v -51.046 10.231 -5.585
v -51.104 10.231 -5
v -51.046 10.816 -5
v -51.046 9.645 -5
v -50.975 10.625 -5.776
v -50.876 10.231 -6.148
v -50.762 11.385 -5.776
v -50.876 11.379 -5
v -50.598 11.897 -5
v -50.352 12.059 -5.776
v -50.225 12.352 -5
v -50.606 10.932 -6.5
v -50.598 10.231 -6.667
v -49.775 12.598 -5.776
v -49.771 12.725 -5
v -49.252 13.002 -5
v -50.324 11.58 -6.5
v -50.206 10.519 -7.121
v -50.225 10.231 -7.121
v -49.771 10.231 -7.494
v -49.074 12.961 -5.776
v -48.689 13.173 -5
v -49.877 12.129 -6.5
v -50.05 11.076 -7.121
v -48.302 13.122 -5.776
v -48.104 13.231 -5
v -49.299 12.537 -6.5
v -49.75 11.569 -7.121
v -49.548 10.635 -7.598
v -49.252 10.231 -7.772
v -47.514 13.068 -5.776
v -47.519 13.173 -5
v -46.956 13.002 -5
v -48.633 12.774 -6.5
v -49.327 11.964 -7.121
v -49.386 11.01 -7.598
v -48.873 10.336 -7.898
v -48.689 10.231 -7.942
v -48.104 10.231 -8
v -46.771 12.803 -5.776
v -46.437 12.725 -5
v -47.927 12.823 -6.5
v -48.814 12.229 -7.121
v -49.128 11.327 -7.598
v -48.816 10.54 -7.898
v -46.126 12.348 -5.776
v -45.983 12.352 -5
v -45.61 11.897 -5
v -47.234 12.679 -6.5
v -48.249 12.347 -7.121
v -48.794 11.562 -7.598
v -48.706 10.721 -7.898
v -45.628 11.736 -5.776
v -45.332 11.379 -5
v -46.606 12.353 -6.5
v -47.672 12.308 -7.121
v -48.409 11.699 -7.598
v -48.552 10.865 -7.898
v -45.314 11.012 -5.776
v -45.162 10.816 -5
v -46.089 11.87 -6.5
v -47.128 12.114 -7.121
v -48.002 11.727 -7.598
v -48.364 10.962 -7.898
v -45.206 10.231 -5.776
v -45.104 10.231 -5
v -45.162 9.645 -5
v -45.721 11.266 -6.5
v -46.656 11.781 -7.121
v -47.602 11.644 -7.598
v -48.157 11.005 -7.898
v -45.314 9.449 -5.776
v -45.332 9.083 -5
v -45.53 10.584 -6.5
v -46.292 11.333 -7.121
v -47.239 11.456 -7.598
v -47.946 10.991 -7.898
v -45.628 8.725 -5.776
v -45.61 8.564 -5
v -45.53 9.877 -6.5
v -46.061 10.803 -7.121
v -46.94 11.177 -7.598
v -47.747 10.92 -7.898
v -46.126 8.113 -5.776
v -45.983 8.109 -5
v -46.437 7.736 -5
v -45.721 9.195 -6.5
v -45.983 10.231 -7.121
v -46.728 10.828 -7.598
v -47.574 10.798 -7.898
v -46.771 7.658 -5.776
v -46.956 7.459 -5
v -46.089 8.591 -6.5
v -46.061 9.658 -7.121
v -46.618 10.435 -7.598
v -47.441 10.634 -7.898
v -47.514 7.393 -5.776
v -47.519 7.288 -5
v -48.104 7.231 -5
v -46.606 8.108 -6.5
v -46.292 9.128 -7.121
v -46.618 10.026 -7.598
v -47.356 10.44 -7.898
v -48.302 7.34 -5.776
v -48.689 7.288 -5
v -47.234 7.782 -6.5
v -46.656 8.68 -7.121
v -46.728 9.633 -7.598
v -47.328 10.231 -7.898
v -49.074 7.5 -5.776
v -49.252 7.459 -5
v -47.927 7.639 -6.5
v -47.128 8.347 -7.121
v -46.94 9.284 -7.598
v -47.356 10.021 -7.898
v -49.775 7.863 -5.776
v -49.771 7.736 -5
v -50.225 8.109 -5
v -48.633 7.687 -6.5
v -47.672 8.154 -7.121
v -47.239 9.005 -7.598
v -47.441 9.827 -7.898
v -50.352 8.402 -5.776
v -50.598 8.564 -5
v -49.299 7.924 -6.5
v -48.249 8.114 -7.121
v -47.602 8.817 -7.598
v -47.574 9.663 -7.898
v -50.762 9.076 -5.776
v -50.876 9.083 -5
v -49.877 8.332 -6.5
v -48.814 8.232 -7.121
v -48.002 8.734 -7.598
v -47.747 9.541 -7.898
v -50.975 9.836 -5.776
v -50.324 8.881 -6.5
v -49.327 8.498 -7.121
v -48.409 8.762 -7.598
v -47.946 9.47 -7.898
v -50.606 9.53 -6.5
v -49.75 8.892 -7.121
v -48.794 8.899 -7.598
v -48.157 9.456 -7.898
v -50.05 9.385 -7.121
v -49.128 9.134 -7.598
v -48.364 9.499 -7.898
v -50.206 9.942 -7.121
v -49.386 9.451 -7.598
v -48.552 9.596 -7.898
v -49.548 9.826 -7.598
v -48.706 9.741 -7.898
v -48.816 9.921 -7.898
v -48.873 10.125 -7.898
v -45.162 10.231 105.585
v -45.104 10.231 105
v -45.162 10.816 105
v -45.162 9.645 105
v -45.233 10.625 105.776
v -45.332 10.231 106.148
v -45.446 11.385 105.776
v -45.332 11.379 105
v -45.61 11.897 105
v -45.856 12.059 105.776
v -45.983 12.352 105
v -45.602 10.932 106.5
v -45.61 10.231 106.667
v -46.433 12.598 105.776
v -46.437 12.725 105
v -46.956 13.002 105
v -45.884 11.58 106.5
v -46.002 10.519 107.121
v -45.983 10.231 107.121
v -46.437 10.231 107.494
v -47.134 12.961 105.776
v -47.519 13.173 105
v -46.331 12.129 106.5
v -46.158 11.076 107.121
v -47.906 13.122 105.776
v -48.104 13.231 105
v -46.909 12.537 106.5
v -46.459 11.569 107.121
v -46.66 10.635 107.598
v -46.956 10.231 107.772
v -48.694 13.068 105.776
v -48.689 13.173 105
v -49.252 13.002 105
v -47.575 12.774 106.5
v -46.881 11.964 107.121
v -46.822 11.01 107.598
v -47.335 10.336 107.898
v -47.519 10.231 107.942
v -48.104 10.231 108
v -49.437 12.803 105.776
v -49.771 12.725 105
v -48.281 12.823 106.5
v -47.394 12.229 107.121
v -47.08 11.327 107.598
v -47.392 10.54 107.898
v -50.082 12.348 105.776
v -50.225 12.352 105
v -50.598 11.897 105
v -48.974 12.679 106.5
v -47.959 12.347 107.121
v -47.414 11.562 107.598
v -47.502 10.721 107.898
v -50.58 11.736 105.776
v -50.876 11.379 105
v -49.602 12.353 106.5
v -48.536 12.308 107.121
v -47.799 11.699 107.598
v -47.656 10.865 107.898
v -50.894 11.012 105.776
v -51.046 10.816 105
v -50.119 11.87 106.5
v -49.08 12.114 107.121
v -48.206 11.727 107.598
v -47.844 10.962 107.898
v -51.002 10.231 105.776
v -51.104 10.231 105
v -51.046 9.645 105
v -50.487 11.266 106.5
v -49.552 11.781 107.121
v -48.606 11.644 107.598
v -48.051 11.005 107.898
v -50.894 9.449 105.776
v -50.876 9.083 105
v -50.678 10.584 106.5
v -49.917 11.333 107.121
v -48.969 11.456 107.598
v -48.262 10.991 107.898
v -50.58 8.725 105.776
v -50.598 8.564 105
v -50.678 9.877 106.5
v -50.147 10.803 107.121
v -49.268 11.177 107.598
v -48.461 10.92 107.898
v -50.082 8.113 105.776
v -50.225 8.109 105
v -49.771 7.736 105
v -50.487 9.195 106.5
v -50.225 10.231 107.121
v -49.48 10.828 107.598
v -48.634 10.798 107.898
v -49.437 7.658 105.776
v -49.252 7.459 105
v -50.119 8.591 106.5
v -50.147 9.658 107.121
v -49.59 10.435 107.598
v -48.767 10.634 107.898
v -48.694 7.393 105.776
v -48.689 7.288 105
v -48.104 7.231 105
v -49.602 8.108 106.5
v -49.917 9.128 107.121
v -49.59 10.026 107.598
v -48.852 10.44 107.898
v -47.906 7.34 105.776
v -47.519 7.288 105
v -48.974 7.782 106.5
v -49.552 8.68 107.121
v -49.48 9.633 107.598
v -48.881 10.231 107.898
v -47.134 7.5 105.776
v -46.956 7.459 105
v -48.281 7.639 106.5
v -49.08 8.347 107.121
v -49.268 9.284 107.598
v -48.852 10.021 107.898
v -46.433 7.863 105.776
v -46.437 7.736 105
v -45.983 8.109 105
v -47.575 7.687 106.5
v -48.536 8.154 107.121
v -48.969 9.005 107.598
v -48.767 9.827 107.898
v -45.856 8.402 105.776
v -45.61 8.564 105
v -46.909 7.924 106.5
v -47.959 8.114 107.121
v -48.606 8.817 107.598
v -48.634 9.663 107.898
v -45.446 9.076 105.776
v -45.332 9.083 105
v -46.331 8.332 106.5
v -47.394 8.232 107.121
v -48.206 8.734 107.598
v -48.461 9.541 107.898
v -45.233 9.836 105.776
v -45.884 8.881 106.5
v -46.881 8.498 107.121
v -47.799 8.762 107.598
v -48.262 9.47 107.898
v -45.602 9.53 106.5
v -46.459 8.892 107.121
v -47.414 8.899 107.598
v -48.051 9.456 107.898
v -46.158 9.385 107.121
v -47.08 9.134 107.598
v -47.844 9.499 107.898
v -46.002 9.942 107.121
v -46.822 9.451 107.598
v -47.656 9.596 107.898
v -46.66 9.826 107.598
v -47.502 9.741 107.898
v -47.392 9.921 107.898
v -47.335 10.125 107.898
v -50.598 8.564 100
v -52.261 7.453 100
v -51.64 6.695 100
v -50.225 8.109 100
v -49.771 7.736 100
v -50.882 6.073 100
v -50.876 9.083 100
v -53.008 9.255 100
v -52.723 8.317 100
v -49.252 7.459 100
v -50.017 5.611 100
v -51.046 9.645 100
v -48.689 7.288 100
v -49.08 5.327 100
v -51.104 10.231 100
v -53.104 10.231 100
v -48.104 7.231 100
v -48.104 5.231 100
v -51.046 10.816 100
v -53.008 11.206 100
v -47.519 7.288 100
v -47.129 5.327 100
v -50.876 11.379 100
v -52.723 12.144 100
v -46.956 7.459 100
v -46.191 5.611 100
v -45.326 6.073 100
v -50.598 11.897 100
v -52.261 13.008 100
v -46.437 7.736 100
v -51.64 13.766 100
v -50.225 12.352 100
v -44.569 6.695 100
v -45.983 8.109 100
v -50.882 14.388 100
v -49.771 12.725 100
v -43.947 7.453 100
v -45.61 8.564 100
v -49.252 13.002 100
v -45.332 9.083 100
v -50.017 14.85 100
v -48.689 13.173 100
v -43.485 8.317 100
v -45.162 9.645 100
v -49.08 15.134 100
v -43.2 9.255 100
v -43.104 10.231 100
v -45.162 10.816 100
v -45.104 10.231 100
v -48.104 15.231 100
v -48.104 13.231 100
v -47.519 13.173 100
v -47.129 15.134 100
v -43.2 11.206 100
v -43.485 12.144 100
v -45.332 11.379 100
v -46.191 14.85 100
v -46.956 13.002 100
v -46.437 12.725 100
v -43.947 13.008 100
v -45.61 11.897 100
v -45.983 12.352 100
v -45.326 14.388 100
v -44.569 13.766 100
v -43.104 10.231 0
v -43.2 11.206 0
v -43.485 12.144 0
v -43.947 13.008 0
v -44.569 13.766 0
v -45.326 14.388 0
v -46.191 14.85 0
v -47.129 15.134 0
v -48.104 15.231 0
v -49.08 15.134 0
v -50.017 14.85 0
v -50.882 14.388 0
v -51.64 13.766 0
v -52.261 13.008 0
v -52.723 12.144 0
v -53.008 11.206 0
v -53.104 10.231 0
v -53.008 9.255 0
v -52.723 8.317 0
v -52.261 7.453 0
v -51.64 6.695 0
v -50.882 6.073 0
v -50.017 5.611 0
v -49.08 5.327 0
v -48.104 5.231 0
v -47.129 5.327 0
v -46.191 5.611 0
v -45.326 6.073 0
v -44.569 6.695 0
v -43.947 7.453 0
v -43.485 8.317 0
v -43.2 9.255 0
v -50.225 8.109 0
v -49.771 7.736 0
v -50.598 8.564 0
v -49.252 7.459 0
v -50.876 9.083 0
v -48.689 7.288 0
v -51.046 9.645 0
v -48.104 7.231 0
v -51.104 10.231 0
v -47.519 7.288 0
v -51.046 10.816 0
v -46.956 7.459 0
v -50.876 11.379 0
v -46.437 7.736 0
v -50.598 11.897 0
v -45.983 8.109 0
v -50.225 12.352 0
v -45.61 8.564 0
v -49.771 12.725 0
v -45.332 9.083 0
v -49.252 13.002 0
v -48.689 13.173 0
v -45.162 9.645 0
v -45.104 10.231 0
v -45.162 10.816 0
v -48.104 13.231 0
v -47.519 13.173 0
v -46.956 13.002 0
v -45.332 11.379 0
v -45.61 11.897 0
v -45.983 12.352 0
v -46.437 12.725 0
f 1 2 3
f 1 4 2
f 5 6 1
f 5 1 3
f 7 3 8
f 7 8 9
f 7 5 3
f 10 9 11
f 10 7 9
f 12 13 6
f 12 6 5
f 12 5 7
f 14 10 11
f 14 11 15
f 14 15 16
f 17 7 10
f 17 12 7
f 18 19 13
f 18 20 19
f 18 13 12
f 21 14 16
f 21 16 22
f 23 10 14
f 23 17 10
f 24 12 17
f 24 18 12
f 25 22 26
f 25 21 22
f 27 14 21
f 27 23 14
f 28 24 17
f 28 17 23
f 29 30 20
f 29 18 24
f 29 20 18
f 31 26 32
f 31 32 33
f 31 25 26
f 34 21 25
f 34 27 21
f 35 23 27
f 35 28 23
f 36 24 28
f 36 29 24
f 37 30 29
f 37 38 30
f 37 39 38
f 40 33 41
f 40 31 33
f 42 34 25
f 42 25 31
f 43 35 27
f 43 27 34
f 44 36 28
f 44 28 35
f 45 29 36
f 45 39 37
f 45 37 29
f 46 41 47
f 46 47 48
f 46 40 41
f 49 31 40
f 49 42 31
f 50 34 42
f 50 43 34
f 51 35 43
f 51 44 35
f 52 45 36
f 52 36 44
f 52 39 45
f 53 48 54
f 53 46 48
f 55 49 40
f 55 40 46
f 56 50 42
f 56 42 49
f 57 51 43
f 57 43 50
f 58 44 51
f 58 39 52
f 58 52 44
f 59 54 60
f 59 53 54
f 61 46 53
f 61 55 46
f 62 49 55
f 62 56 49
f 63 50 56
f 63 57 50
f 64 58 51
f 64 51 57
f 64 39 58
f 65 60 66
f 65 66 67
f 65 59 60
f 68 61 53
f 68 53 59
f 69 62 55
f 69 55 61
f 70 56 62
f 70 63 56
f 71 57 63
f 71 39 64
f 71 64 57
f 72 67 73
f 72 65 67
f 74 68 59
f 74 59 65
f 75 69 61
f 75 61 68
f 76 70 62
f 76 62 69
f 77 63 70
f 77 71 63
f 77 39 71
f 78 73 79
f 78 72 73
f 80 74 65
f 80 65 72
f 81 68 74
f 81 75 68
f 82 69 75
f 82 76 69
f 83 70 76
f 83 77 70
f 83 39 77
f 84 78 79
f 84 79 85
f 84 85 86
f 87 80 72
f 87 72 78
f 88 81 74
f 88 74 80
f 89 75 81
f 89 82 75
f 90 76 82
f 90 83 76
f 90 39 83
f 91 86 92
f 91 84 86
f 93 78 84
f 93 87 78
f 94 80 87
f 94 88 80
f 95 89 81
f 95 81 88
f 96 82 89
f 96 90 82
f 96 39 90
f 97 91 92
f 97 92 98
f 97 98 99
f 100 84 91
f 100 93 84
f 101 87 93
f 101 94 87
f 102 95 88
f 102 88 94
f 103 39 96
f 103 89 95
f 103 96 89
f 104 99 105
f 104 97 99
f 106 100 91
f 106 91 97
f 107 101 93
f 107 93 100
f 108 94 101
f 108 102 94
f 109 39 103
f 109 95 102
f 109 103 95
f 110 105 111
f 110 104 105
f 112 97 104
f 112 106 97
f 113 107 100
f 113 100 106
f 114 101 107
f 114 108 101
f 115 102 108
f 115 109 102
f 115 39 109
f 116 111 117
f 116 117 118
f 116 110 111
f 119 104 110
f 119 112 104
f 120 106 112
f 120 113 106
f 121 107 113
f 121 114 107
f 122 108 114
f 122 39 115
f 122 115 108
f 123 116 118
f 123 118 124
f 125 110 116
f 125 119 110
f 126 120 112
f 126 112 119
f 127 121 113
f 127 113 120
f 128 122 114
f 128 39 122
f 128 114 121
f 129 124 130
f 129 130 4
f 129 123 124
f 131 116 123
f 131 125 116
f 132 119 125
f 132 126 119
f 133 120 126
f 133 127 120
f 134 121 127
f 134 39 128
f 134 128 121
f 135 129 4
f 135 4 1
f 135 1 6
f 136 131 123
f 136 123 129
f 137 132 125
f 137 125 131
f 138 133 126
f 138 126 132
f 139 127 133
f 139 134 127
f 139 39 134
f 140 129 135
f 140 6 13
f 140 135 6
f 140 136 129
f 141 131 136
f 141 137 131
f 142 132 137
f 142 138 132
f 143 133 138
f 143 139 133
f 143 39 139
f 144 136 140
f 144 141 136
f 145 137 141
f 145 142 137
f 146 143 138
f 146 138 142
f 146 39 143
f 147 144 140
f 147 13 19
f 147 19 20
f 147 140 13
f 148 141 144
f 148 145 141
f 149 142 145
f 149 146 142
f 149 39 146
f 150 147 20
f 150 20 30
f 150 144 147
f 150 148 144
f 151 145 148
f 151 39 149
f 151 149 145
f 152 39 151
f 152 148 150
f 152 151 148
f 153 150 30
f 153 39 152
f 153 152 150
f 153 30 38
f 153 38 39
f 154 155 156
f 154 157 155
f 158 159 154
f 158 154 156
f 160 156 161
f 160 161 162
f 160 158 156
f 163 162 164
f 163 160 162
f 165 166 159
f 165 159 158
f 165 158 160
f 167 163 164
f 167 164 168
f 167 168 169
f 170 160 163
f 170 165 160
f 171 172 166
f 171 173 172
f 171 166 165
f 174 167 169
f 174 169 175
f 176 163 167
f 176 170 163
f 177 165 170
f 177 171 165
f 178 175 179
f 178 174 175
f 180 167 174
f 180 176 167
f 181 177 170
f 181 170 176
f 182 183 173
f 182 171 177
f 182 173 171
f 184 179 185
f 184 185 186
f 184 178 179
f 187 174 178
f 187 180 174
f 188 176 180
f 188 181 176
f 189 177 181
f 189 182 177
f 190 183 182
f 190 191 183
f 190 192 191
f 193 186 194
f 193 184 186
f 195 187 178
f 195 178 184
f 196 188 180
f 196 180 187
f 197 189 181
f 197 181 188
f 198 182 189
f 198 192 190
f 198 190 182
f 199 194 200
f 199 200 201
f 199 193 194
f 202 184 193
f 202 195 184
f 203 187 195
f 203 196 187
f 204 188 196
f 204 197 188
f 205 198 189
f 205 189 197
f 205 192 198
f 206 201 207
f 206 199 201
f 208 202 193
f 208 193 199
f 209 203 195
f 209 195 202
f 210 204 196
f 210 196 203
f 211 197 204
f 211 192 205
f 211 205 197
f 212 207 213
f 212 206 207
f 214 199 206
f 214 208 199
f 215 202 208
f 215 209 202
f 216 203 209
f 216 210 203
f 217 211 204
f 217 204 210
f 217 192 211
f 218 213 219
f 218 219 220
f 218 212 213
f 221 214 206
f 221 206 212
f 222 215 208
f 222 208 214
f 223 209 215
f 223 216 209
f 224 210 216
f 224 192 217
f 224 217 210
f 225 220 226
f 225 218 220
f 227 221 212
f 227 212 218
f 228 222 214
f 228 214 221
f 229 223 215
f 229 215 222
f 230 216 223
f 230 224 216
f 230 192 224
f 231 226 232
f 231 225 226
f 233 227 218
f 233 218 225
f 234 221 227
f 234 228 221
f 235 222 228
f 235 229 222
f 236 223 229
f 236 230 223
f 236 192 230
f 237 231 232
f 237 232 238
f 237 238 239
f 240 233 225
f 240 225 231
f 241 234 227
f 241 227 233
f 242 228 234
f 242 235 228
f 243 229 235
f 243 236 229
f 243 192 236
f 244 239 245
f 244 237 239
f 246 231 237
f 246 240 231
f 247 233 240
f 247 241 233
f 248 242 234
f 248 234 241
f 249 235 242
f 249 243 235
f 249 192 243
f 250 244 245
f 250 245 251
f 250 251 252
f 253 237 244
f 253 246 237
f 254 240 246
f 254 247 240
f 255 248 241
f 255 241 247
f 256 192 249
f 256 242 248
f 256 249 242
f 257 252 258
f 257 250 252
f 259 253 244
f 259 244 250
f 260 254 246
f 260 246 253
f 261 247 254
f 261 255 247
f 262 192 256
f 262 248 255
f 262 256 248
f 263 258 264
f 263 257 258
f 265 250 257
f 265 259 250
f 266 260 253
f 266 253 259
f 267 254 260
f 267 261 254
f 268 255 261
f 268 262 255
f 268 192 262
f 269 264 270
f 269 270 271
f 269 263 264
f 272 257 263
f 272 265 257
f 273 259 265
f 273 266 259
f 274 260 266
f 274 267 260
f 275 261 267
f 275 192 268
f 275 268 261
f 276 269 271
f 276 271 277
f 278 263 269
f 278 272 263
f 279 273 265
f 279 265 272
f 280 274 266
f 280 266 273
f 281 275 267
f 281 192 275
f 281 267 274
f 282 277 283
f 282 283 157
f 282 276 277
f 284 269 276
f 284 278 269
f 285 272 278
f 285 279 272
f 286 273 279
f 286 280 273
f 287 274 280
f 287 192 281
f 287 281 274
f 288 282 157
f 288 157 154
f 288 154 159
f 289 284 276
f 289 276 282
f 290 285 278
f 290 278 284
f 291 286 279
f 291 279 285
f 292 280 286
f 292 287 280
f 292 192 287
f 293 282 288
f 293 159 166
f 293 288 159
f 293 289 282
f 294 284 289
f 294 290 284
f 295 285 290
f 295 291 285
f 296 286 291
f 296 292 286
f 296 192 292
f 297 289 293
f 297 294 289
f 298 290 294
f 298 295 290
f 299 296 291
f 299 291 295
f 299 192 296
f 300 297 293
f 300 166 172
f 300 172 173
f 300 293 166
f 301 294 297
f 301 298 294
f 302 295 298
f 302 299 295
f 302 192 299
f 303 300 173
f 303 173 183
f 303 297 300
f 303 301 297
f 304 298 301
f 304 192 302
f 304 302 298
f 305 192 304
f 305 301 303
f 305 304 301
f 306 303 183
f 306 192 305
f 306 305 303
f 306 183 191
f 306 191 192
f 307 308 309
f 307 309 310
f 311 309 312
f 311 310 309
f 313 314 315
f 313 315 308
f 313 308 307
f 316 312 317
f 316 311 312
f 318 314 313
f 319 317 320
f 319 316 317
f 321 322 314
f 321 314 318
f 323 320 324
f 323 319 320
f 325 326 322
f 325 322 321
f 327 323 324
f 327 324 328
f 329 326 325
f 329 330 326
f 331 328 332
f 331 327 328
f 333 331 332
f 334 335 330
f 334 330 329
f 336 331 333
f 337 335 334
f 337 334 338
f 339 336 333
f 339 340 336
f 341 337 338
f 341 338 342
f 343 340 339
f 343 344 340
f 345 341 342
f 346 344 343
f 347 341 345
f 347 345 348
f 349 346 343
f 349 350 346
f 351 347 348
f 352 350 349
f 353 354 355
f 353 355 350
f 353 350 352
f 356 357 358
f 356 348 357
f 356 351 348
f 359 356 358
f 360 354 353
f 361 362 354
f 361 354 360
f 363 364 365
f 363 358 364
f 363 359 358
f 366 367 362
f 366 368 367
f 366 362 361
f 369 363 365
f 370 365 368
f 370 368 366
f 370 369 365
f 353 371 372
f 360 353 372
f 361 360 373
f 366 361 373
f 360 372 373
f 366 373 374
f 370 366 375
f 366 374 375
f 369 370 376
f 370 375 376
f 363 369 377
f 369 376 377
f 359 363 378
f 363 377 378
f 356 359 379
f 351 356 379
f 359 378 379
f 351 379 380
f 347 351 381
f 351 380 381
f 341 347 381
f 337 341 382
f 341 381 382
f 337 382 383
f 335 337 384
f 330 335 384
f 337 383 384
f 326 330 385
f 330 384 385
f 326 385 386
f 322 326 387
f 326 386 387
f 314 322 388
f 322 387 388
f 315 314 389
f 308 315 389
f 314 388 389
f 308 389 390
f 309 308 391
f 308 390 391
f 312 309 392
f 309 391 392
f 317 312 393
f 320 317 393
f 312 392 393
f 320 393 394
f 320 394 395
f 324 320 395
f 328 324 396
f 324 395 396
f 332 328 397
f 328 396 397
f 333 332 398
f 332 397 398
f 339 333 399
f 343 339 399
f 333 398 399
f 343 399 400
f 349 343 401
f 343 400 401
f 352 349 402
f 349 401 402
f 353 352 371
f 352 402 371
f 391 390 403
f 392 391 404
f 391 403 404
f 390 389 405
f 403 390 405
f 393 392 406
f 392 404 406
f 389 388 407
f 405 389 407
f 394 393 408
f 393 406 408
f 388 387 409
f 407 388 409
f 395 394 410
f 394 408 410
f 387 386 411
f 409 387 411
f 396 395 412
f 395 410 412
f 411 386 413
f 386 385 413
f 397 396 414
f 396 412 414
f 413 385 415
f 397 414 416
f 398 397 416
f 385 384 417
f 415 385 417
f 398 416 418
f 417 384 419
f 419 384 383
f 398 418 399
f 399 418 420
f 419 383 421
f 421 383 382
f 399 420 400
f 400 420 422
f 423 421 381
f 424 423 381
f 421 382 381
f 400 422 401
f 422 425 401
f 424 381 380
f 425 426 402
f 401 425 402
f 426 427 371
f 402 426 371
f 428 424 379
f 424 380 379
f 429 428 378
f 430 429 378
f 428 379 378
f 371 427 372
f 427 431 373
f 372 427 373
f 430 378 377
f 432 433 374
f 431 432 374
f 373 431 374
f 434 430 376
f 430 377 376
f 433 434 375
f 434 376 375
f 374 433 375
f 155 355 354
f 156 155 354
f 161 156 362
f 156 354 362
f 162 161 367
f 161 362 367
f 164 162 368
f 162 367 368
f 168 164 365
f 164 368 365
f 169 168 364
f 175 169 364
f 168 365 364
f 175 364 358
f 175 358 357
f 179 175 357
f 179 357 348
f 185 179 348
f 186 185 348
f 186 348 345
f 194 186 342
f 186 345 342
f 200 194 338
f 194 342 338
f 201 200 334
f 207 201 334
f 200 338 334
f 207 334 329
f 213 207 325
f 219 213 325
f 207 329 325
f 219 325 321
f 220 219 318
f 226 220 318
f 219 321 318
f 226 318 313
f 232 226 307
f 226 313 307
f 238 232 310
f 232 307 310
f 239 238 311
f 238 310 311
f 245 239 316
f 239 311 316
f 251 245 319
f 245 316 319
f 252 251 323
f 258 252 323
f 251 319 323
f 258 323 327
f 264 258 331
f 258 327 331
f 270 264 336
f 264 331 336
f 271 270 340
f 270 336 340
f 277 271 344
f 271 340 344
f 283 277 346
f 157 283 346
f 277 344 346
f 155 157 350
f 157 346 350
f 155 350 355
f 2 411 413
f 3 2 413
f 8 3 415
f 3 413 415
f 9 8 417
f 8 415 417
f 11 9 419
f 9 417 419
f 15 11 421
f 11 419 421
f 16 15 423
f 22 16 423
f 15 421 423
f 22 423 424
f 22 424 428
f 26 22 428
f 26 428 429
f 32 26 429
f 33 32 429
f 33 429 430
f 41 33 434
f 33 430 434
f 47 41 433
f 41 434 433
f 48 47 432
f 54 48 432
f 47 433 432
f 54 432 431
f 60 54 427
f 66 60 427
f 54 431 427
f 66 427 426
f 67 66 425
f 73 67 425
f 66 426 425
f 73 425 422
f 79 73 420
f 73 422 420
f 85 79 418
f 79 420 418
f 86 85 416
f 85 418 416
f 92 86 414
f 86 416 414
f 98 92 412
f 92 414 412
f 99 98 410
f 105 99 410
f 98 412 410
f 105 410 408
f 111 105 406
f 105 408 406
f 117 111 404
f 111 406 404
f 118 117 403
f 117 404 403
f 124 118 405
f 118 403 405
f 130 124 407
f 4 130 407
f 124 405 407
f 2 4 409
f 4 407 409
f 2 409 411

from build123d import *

# Parameters (mm, degrees)
SKETCH1_R           = 5
BOSS_EXTRUDE1_DEPTH = 100
SKETCH2_R           = 3
BOSS_EXTRUDE2_DEPTH = 8
SKETCH4_R           = 3
BOSS_EXTRUDE3_DEPTH = 8
FILLET1_R           = 3


with BuildPart() as part:
    # Sketch1 → Boss-Extrude1 (new body)
    with BuildSketch(Plane.XY):
        with Locations((-48.10405297, 10.230555556)):
            Circle(SKETCH1_R)
    extrude(amount=BOSS_EXTRUDE1_DEPTH)

    # Sketch2 → Boss-Extrude2 (add)
    with BuildSketch(Plane.XY.offset(100)):
        with Locations((-48.10405297, 10.230555556)):
            Circle(SKETCH2_R)
    extrude(amount=BOSS_EXTRUDE2_DEPTH)

    # Sketch4 → Boss-Extrude3 (add)
    with BuildSketch(Plane(origin=(0, 0, 0), x_dir=(-1, 0, 0), z_dir=(0, 0, -1))):
        with Locations((48.10405297, 10.230555556)):
            Circle(SKETCH4_R)
    extrude(amount=BOSS_EXTRUDE3_DEPTH)

    # Fillet1
    fillet1_edges = [part.edges().sort_by_distance(p)[0] for p in [
        (-45.10405297, 10.230555556, -8),
        (-51.10405297, 10.230555556, 108),
    ]]
    fillet(fillet1_edges, radius=FILLET1_R)


solid = part.part
